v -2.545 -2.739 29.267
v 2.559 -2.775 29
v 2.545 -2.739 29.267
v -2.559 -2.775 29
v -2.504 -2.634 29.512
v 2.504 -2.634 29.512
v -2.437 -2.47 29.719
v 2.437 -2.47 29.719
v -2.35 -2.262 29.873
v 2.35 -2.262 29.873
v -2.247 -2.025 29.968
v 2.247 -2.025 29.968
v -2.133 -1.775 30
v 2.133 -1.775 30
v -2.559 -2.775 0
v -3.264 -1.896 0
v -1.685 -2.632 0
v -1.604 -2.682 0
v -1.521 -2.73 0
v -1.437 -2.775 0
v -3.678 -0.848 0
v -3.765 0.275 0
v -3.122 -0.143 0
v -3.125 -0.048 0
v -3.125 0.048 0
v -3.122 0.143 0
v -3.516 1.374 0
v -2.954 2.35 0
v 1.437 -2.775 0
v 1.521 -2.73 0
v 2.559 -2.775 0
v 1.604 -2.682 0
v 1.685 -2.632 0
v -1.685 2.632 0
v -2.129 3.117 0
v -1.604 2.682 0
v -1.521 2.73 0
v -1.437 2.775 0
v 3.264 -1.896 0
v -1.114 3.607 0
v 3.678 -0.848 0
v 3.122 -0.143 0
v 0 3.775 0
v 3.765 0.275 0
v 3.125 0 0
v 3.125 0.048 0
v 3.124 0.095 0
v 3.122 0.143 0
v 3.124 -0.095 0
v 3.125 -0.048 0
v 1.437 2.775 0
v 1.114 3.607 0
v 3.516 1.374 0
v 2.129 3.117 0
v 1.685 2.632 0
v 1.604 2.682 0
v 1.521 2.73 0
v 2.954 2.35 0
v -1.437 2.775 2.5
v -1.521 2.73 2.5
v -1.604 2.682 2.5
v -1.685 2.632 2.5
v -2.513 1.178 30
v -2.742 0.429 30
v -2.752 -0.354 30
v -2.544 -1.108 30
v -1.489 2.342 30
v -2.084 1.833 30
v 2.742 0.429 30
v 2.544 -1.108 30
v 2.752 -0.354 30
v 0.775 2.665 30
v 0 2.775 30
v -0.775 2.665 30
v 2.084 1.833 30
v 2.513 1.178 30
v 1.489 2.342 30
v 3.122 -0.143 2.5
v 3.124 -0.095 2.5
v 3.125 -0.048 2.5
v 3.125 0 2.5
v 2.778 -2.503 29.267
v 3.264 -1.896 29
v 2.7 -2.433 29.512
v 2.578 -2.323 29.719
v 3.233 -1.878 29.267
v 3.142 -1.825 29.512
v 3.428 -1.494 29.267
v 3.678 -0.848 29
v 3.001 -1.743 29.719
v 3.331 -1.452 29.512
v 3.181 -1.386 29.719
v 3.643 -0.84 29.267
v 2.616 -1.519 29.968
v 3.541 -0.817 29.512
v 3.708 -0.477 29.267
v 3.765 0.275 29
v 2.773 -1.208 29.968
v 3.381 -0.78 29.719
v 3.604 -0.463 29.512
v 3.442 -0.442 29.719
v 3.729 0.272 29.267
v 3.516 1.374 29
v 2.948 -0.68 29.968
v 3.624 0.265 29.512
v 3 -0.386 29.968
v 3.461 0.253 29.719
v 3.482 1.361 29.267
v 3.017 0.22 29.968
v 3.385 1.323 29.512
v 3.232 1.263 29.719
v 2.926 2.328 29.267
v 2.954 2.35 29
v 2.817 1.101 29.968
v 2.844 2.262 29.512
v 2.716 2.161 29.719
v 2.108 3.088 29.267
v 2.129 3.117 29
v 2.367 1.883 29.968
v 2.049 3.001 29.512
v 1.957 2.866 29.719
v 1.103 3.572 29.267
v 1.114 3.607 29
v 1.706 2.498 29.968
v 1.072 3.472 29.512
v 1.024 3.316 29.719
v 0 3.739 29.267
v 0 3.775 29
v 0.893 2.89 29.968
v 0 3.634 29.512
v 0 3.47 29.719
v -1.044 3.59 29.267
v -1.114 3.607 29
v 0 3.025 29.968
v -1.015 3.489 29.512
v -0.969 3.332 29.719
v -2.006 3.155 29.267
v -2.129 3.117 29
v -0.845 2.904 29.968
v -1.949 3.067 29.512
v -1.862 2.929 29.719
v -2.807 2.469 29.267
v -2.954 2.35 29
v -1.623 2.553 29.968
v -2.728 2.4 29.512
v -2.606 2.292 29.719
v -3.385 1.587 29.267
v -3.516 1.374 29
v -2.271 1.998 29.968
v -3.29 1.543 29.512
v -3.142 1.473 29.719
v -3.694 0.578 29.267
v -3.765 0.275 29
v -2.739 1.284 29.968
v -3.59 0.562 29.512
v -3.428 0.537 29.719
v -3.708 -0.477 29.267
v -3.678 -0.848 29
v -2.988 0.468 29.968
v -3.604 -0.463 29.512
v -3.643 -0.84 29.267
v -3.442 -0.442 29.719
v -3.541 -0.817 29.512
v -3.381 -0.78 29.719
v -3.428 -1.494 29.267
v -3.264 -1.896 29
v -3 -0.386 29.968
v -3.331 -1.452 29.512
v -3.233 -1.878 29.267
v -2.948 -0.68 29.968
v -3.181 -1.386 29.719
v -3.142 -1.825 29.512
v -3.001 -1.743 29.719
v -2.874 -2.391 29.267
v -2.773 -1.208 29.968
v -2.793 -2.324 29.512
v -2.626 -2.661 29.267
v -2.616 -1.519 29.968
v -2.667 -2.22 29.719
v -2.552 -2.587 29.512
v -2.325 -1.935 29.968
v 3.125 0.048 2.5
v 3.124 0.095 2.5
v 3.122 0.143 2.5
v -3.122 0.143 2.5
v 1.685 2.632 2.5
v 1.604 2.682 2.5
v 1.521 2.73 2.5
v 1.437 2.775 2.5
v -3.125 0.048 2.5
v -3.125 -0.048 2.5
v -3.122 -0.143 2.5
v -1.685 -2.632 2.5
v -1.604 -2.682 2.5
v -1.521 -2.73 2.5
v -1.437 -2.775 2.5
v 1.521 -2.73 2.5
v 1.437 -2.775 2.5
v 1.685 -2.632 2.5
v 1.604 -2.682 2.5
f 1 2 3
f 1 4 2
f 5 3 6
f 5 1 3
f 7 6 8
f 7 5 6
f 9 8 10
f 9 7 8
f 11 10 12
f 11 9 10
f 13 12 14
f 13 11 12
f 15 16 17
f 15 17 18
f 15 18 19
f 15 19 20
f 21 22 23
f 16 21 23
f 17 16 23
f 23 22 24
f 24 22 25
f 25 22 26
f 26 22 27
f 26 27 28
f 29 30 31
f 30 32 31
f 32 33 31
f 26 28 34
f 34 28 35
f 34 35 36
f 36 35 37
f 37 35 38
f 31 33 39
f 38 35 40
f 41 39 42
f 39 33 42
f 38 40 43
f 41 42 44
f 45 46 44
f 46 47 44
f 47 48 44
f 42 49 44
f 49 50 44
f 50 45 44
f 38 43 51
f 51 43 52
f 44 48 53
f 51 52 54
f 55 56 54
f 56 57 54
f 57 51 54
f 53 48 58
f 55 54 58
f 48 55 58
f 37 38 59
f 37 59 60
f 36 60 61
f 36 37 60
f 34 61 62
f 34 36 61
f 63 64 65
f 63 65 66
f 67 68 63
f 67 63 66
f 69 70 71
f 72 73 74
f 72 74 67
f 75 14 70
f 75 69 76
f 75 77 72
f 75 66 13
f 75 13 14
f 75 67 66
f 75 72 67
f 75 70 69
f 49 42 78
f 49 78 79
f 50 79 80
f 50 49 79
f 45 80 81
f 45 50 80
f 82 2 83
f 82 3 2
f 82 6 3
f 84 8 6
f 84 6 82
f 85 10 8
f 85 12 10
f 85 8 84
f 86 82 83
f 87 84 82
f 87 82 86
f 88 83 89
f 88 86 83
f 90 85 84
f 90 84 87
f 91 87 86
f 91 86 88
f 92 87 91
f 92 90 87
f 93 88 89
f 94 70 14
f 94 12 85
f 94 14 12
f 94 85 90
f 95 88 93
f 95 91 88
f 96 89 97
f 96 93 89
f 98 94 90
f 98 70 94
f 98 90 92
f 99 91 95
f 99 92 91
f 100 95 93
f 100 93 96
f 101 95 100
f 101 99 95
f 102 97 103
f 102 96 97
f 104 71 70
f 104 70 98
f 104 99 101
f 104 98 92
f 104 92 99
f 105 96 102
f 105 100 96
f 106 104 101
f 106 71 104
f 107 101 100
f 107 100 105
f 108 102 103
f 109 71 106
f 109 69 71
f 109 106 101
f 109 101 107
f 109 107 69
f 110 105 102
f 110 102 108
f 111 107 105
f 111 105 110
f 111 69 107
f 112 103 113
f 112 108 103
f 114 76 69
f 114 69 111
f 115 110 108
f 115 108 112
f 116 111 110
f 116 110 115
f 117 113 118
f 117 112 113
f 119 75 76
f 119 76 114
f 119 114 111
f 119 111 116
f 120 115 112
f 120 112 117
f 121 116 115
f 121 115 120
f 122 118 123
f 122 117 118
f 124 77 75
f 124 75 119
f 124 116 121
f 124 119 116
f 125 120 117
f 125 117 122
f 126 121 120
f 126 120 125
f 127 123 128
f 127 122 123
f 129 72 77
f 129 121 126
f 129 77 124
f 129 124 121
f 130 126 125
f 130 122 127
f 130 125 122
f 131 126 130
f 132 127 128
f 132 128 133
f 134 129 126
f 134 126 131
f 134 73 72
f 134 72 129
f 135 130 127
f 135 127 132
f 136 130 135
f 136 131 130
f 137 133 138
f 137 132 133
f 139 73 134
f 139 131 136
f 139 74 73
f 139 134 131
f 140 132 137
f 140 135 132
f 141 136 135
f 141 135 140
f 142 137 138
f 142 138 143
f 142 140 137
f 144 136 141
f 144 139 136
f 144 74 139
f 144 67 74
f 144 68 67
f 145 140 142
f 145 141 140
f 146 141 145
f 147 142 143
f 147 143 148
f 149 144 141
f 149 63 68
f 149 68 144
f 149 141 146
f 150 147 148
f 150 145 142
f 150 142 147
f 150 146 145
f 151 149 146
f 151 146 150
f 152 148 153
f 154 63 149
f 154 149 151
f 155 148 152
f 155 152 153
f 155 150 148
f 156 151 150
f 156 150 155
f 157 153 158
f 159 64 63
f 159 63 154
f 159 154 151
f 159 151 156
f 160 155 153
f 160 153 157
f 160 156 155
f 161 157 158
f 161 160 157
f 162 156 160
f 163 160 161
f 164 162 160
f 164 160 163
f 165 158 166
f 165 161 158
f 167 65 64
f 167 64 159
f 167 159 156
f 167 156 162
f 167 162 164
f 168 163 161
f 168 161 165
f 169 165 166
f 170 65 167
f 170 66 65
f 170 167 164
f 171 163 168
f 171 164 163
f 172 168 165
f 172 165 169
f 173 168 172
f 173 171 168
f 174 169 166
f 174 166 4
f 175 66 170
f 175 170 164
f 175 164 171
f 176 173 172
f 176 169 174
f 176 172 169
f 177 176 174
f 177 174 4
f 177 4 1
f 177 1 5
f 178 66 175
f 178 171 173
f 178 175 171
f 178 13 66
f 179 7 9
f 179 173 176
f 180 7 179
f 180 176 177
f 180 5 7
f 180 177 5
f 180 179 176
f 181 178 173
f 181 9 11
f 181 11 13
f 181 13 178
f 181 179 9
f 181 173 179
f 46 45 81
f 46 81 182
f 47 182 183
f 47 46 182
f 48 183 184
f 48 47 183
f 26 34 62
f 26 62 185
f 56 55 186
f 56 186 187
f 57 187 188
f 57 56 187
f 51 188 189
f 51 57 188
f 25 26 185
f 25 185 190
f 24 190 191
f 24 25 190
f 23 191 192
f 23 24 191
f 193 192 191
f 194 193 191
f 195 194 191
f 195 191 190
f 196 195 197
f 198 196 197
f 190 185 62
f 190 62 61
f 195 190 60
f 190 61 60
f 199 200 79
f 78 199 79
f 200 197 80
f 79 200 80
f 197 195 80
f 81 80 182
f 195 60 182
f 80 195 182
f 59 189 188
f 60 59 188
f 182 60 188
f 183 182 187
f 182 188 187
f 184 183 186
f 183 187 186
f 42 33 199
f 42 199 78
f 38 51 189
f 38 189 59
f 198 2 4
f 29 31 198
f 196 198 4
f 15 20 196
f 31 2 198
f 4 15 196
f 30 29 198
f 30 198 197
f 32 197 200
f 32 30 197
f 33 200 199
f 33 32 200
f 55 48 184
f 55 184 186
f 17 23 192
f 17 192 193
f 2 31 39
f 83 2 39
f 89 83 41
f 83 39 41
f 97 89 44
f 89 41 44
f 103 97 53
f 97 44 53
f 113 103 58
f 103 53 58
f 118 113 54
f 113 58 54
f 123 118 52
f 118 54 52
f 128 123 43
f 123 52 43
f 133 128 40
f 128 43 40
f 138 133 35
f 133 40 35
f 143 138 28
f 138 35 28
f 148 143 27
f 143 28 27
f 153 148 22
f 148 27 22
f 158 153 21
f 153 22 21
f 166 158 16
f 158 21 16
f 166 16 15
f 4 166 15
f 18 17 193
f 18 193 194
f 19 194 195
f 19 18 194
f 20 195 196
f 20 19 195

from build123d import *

# Parameters (mm, degrees)
F1_DEPTH    = 30
F2_DEPTH    = 2.5
F3_DEPTH    = 30
F4_T1_DEPTH = 10.1185935568
F4_T4_ANGLE = 350.8041938213


# Not quite as in the source:
# - a fillet or chamfer that OpenCascade refuses, or shapes differently, is made with other operations: its cross-section is extruded or revolved along the edge and cut away or added


with BuildPart() as f1:
    # F0 (on Top) → F1 (new body)
    with BuildSketch(Plane.XY):
        with BuildLine():
            Line((-1.4370107863, -2.775), (-1.602146997, -2.775))
            Line((-1.602146997, -2.775), (-2.5592967784, -2.775))
            ThreePointArc((-2.5592967784, -2.775), (0, -3.775), (2.5592967784, -2.775))
            Line((2.5592967784, -2.775), (1.602146997, -2.775))
            Line((1.602146997, -2.775), (1.4370107863, -2.775))
            ThreePointArc((1.4370107863, -2.775), (0, -3.125), (-1.4370107863, -2.775))
        make_face()
        with BuildLine():
            Line((-1.6847151023, 2.6319878465), (-1.602146997, 2.775))
            Line((-1.602146997, 2.775), (-1.4370107863, 2.775))
            ThreePointArc((-1.4370107863, 2.775), (0, 3.125), (1.4370107863, 2.775))
            Line((1.4370107863, 2.775), (1.602146997, 2.775))
            Line((1.602146997, 2.775), (1.6847151023, 2.6319878465))
            ThreePointArc((1.6847151023, 2.6319878465), (2.7063293868, 1.5625), (3.1217258887, 0.1430121535))
            Line((3.1217258887, 0.1430121535), (3.204293994, 0))
            Line((3.204293994, 0), (3.1217258887, -0.1430121535))
            ThreePointArc((3.1217258887, -0.1430121535), (2.7063293868, -1.5625), (1.6847151023, -2.6319878465))
            Line((1.6847151023, -2.6319878465), (1.602146997, -2.775))
            Line((1.602146997, -2.775), (2.5592967784, -2.775))
            ThreePointArc((2.5592967784, -2.775), (3.4577427853, -1.5148068625), (3.775, 0))
            ThreePointArc((3.775, 0), (-1.5148068625, 3.4577427853), (-2.5592967784, -2.775))
            Line((-2.5592967784, -2.775), (-1.602146997, -2.775))
            Line((-1.602146997, -2.775), (-1.6847151023, -2.6319878465))
            ThreePointArc((-1.6847151023, -2.6319878465), (-2.7063293868, -1.5625), (-3.1217258887, -0.1430121535))
            Line((-3.1217258887, -0.1430121535), (-3.204293994, 0))
            Line((-3.204293994, 0), (-3.1217258887, 0.1430121535))
            ThreePointArc((-3.1217258887, 0.1430121535), (-2.7063293868, 1.5625), (-1.6847151023, 2.6319878465))
        make_face()
        with BuildLine():
            ThreePointArc((3.1217258887, 0.1430121535), (2.7063293868, 1.5625), (1.6847151023, 2.6319878465))
            Line((1.6847151023, 2.6319878465), (3.1217258887, 0.1430121535))
        make_face()
        with BuildLine():
            Line((1.4370107863, -2.775), (-1.4370107863, -2.775))
            ThreePointArc((-1.4370107863, -2.775), (0, -3.125), (1.4370107863, -2.775))
        make_face()
        with BuildLine():
            ThreePointArc((1.4370107863, 2.775), (0, 3.125), (-1.4370107863, 2.775))
            Line((-1.4370107863, 2.775), (1.4370107863, 2.775))
        make_face()
        with BuildLine():
            Line((-3.1217258887, 0.1430121535), (-1.6847151023, 2.6319878465))
            ThreePointArc((-1.6847151023, 2.6319878465), (-2.7063293868, 1.5625), (-3.1217258887, 0.1430121535))
        make_face()
        with BuildLine():
            Line((1.4370107863, 2.775), (-1.4370107863, 2.775))
            ThreePointArc((-1.4370107863, 2.775), (-1.5625, 2.7063293868), (-1.6847151023, 2.6319878465))
            Line((-1.6847151023, 2.6319878465), (-3.1217258887, 0.1430121535))
            ThreePointArc((-3.1217258887, 0.1430121535), (-3.125, 0), (-3.1217258887, -0.1430121535))
            Line((-3.1217258887, -0.1430121535), (-1.6847151023, -2.6319878465))
            ThreePointArc((-1.6847151023, -2.6319878465), (-1.5625, -2.7063293868), (-1.4370107863, -2.775))
            Line((-1.4370107863, -2.775), (1.4370107863, -2.775))
            ThreePointArc((1.4370107863, -2.775), (1.5625, -2.7063293868), (1.6847151023, -2.6319878465))
            Line((1.6847151023, -2.6319878465), (3.1217258887, -0.1430121535))
            ThreePointArc((3.1217258887, -0.1430121535), (3.1241813649, -0.0715248136), (3.125, 0))
            ThreePointArc((3.125, 0), (3.1241813649, 0.0715248136), (3.1217258887, 0.1430121535))
            Line((3.1217258887, 0.1430121535), (1.6847151023, 2.6319878465))
            ThreePointArc((1.6847151023, 2.6319878465), (1.5625, 2.7063293868), (1.4370107863, 2.775))
        make_face()
        with BuildLine():
            Line((-1.6847151023, -2.6319878465), (-3.1217258887, -0.1430121535))
            ThreePointArc((-3.1217258887, -0.1430121535), (-2.7063293868, -1.5625), (-1.6847151023, -2.6319878465))
        make_face()
        with BuildLine():
            ThreePointArc((1.6847151023, -2.6319878465), (2.7063293868, -1.5625), (3.1217258887, -0.1430121535))
            Line((3.1217258887, -0.1430121535), (1.6847151023, -2.6319878465))
        make_face()
        with BuildLine():
            ThreePointArc((-1.4370107863, -2.775), (-1.5625, -2.7063293868), (-1.6847151023, -2.6319878465))
            Line((-1.6847151023, -2.6319878465), (-1.602146997, -2.775))
            Line((-1.602146997, -2.775), (-1.4370107863, -2.775))
        make_face()
        with BuildLine():
            ThreePointArc((1.6847151023, -2.6319878465), (1.5625, -2.7063293868), (1.4370107863, -2.775))
            Line((1.4370107863, -2.775), (1.602146997, -2.775))
            Line((1.602146997, -2.775), (1.6847151023, -2.6319878465))
        make_face()
        with BuildLine():
            Line((3.204293994, 0), (3.1217258887, 0.1430121535))
            ThreePointArc((3.1217258887, 0.1430121535), (3.1241813649, 0.0715248136), (3.125, 0))
            ThreePointArc((3.125, 0), (3.1241813649, -0.0715248136), (3.1217258887, -0.1430121535))
            Line((3.1217258887, -0.1430121535), (3.204293994, 0))
        make_face()
        with BuildLine():
            ThreePointArc((-3.1217258887, -0.1430121535), (-3.125, 0), (-3.1217258887, 0.1430121535))
            Line((-3.1217258887, 0.1430121535), (-3.204293994, 0))
            Line((-3.204293994, 0), (-3.1217258887, -0.1430121535))
        make_face()
        with BuildLine():
            Line((1.602146997, 2.775), (1.4370107863, 2.775))
            ThreePointArc((1.4370107863, 2.775), (1.5625, 2.7063293868), (1.6847151023, 2.6319878465))
            Line((1.6847151023, 2.6319878465), (1.602146997, 2.775))
        make_face()
        with BuildLine():
            Line((-1.4370107863, 2.775), (-1.602146997, 2.775))
            Line((-1.602146997, 2.775), (-1.6847151023, 2.6319878465))
            ThreePointArc((-1.6847151023, 2.6319878465), (-1.5625, 2.7063293868), (-1.4370107863, 2.775))
        make_face()
    extrude(amount=F1_DEPTH)

    # F0 (on Top) → F2 (cut)
    with BuildSketch(Plane.XY):
        with BuildLine():
            Line((1.4370107863, 2.775), (-1.4370107863, 2.775))
            ThreePointArc((-1.4370107863, 2.775), (-1.5625, 2.7063293868), (-1.6847151023, 2.6319878465))
            Line((-1.6847151023, 2.6319878465), (-3.1217258887, 0.1430121535))
            ThreePointArc((-3.1217258887, 0.1430121535), (-3.125, 0), (-3.1217258887, -0.1430121535))
            Line((-3.1217258887, -0.1430121535), (-1.6847151023, -2.6319878465))
            ThreePointArc((-1.6847151023, -2.6319878465), (-1.5625, -2.7063293868), (-1.4370107863, -2.775))
            Line((-1.4370107863, -2.775), (1.4370107863, -2.775))
            ThreePointArc((1.4370107863, -2.775), (1.5625, -2.7063293868), (1.6847151023, -2.6319878465))
            Line((1.6847151023, -2.6319878465), (3.1217258887, -0.1430121535))
            ThreePointArc((3.1217258887, -0.1430121535), (3.1241813649, -0.0715248136), (3.125, 0))
            ThreePointArc((3.125, 0), (3.1241813649, 0.0715248136), (3.1217258887, 0.1430121535))
            Line((3.1217258887, 0.1430121535), (1.6847151023, 2.6319878465))
            ThreePointArc((1.6847151023, 2.6319878465), (1.5625, 2.7063293868), (1.4370107863, 2.775))
        make_face()
    extrude(amount=F2_DEPTH, mode=Mode.SUBTRACT)

    # F0 (on Top) → F3 (cut, through all)
    with BuildSketch(Plane.XY):
        with BuildLine():
            Line((1.4370107863, -2.775), (-1.4370107863, -2.775))
            ThreePointArc((-1.4370107863, -2.775), (0, -3.125), (1.4370107863, -2.775))
        make_face()
        with BuildLine():
            Line((-1.4370107863, -2.775), (-1.602146997, -2.775))
            Line((-1.602146997, -2.775), (-2.5592967784, -2.775))
            ThreePointArc((-2.5592967784, -2.775), (0, -3.775), (2.5592967784, -2.775))
            Line((2.5592967784, -2.775), (1.602146997, -2.775))
            Line((1.602146997, -2.775), (1.4370107863, -2.775))
            ThreePointArc((1.4370107863, -2.775), (0, -3.125), (-1.4370107863, -2.775))
        make_face()
    extrude(amount=F3_DEPTH, mode=Mode.SUBTRACT)

    # F4: fillet of radius 1 on 2 edges, made by hand

    # F4_s2 → F4_t1 (cut)
    with BuildSketch(Plane.YZ.offset(-5.0592967784)):
        with BuildLine():
            ThreePointArc((-2.775, 29), (-2.4821067812, 29.7071067812), (-1.775, 30))
            Line((-1.775, 30), (-2.775, 30))
            Line((-2.775, 30), (-2.775, 29))
        make_face()
    extrude(amount=F4_T1_DEPTH, mode=Mode.SUBTRACT)

    # F4_s3 → F4_t4 (revolve, cut)
    with BuildSketch(Plane(origin=(0, 0, 0), x_dir=(0, 0, 1), z_dir=(-0.9967818129, -0.0801624442, 0))):
        with BuildLine():
            ThreePointArc((29, -3.775), (29.7071067812, -3.4821067812), (30, -2.775))
            Line((30, -2.775), (30, -3.775))
            Line((30, -3.775), (29, -3.775))
        make_face()
    revolve(axis=Axis((0, 0, 30), (0, 0, 1)), revolution_arc=F4_T4_ANGLE, mode=Mode.SUBTRACT)


solid = f1.part
